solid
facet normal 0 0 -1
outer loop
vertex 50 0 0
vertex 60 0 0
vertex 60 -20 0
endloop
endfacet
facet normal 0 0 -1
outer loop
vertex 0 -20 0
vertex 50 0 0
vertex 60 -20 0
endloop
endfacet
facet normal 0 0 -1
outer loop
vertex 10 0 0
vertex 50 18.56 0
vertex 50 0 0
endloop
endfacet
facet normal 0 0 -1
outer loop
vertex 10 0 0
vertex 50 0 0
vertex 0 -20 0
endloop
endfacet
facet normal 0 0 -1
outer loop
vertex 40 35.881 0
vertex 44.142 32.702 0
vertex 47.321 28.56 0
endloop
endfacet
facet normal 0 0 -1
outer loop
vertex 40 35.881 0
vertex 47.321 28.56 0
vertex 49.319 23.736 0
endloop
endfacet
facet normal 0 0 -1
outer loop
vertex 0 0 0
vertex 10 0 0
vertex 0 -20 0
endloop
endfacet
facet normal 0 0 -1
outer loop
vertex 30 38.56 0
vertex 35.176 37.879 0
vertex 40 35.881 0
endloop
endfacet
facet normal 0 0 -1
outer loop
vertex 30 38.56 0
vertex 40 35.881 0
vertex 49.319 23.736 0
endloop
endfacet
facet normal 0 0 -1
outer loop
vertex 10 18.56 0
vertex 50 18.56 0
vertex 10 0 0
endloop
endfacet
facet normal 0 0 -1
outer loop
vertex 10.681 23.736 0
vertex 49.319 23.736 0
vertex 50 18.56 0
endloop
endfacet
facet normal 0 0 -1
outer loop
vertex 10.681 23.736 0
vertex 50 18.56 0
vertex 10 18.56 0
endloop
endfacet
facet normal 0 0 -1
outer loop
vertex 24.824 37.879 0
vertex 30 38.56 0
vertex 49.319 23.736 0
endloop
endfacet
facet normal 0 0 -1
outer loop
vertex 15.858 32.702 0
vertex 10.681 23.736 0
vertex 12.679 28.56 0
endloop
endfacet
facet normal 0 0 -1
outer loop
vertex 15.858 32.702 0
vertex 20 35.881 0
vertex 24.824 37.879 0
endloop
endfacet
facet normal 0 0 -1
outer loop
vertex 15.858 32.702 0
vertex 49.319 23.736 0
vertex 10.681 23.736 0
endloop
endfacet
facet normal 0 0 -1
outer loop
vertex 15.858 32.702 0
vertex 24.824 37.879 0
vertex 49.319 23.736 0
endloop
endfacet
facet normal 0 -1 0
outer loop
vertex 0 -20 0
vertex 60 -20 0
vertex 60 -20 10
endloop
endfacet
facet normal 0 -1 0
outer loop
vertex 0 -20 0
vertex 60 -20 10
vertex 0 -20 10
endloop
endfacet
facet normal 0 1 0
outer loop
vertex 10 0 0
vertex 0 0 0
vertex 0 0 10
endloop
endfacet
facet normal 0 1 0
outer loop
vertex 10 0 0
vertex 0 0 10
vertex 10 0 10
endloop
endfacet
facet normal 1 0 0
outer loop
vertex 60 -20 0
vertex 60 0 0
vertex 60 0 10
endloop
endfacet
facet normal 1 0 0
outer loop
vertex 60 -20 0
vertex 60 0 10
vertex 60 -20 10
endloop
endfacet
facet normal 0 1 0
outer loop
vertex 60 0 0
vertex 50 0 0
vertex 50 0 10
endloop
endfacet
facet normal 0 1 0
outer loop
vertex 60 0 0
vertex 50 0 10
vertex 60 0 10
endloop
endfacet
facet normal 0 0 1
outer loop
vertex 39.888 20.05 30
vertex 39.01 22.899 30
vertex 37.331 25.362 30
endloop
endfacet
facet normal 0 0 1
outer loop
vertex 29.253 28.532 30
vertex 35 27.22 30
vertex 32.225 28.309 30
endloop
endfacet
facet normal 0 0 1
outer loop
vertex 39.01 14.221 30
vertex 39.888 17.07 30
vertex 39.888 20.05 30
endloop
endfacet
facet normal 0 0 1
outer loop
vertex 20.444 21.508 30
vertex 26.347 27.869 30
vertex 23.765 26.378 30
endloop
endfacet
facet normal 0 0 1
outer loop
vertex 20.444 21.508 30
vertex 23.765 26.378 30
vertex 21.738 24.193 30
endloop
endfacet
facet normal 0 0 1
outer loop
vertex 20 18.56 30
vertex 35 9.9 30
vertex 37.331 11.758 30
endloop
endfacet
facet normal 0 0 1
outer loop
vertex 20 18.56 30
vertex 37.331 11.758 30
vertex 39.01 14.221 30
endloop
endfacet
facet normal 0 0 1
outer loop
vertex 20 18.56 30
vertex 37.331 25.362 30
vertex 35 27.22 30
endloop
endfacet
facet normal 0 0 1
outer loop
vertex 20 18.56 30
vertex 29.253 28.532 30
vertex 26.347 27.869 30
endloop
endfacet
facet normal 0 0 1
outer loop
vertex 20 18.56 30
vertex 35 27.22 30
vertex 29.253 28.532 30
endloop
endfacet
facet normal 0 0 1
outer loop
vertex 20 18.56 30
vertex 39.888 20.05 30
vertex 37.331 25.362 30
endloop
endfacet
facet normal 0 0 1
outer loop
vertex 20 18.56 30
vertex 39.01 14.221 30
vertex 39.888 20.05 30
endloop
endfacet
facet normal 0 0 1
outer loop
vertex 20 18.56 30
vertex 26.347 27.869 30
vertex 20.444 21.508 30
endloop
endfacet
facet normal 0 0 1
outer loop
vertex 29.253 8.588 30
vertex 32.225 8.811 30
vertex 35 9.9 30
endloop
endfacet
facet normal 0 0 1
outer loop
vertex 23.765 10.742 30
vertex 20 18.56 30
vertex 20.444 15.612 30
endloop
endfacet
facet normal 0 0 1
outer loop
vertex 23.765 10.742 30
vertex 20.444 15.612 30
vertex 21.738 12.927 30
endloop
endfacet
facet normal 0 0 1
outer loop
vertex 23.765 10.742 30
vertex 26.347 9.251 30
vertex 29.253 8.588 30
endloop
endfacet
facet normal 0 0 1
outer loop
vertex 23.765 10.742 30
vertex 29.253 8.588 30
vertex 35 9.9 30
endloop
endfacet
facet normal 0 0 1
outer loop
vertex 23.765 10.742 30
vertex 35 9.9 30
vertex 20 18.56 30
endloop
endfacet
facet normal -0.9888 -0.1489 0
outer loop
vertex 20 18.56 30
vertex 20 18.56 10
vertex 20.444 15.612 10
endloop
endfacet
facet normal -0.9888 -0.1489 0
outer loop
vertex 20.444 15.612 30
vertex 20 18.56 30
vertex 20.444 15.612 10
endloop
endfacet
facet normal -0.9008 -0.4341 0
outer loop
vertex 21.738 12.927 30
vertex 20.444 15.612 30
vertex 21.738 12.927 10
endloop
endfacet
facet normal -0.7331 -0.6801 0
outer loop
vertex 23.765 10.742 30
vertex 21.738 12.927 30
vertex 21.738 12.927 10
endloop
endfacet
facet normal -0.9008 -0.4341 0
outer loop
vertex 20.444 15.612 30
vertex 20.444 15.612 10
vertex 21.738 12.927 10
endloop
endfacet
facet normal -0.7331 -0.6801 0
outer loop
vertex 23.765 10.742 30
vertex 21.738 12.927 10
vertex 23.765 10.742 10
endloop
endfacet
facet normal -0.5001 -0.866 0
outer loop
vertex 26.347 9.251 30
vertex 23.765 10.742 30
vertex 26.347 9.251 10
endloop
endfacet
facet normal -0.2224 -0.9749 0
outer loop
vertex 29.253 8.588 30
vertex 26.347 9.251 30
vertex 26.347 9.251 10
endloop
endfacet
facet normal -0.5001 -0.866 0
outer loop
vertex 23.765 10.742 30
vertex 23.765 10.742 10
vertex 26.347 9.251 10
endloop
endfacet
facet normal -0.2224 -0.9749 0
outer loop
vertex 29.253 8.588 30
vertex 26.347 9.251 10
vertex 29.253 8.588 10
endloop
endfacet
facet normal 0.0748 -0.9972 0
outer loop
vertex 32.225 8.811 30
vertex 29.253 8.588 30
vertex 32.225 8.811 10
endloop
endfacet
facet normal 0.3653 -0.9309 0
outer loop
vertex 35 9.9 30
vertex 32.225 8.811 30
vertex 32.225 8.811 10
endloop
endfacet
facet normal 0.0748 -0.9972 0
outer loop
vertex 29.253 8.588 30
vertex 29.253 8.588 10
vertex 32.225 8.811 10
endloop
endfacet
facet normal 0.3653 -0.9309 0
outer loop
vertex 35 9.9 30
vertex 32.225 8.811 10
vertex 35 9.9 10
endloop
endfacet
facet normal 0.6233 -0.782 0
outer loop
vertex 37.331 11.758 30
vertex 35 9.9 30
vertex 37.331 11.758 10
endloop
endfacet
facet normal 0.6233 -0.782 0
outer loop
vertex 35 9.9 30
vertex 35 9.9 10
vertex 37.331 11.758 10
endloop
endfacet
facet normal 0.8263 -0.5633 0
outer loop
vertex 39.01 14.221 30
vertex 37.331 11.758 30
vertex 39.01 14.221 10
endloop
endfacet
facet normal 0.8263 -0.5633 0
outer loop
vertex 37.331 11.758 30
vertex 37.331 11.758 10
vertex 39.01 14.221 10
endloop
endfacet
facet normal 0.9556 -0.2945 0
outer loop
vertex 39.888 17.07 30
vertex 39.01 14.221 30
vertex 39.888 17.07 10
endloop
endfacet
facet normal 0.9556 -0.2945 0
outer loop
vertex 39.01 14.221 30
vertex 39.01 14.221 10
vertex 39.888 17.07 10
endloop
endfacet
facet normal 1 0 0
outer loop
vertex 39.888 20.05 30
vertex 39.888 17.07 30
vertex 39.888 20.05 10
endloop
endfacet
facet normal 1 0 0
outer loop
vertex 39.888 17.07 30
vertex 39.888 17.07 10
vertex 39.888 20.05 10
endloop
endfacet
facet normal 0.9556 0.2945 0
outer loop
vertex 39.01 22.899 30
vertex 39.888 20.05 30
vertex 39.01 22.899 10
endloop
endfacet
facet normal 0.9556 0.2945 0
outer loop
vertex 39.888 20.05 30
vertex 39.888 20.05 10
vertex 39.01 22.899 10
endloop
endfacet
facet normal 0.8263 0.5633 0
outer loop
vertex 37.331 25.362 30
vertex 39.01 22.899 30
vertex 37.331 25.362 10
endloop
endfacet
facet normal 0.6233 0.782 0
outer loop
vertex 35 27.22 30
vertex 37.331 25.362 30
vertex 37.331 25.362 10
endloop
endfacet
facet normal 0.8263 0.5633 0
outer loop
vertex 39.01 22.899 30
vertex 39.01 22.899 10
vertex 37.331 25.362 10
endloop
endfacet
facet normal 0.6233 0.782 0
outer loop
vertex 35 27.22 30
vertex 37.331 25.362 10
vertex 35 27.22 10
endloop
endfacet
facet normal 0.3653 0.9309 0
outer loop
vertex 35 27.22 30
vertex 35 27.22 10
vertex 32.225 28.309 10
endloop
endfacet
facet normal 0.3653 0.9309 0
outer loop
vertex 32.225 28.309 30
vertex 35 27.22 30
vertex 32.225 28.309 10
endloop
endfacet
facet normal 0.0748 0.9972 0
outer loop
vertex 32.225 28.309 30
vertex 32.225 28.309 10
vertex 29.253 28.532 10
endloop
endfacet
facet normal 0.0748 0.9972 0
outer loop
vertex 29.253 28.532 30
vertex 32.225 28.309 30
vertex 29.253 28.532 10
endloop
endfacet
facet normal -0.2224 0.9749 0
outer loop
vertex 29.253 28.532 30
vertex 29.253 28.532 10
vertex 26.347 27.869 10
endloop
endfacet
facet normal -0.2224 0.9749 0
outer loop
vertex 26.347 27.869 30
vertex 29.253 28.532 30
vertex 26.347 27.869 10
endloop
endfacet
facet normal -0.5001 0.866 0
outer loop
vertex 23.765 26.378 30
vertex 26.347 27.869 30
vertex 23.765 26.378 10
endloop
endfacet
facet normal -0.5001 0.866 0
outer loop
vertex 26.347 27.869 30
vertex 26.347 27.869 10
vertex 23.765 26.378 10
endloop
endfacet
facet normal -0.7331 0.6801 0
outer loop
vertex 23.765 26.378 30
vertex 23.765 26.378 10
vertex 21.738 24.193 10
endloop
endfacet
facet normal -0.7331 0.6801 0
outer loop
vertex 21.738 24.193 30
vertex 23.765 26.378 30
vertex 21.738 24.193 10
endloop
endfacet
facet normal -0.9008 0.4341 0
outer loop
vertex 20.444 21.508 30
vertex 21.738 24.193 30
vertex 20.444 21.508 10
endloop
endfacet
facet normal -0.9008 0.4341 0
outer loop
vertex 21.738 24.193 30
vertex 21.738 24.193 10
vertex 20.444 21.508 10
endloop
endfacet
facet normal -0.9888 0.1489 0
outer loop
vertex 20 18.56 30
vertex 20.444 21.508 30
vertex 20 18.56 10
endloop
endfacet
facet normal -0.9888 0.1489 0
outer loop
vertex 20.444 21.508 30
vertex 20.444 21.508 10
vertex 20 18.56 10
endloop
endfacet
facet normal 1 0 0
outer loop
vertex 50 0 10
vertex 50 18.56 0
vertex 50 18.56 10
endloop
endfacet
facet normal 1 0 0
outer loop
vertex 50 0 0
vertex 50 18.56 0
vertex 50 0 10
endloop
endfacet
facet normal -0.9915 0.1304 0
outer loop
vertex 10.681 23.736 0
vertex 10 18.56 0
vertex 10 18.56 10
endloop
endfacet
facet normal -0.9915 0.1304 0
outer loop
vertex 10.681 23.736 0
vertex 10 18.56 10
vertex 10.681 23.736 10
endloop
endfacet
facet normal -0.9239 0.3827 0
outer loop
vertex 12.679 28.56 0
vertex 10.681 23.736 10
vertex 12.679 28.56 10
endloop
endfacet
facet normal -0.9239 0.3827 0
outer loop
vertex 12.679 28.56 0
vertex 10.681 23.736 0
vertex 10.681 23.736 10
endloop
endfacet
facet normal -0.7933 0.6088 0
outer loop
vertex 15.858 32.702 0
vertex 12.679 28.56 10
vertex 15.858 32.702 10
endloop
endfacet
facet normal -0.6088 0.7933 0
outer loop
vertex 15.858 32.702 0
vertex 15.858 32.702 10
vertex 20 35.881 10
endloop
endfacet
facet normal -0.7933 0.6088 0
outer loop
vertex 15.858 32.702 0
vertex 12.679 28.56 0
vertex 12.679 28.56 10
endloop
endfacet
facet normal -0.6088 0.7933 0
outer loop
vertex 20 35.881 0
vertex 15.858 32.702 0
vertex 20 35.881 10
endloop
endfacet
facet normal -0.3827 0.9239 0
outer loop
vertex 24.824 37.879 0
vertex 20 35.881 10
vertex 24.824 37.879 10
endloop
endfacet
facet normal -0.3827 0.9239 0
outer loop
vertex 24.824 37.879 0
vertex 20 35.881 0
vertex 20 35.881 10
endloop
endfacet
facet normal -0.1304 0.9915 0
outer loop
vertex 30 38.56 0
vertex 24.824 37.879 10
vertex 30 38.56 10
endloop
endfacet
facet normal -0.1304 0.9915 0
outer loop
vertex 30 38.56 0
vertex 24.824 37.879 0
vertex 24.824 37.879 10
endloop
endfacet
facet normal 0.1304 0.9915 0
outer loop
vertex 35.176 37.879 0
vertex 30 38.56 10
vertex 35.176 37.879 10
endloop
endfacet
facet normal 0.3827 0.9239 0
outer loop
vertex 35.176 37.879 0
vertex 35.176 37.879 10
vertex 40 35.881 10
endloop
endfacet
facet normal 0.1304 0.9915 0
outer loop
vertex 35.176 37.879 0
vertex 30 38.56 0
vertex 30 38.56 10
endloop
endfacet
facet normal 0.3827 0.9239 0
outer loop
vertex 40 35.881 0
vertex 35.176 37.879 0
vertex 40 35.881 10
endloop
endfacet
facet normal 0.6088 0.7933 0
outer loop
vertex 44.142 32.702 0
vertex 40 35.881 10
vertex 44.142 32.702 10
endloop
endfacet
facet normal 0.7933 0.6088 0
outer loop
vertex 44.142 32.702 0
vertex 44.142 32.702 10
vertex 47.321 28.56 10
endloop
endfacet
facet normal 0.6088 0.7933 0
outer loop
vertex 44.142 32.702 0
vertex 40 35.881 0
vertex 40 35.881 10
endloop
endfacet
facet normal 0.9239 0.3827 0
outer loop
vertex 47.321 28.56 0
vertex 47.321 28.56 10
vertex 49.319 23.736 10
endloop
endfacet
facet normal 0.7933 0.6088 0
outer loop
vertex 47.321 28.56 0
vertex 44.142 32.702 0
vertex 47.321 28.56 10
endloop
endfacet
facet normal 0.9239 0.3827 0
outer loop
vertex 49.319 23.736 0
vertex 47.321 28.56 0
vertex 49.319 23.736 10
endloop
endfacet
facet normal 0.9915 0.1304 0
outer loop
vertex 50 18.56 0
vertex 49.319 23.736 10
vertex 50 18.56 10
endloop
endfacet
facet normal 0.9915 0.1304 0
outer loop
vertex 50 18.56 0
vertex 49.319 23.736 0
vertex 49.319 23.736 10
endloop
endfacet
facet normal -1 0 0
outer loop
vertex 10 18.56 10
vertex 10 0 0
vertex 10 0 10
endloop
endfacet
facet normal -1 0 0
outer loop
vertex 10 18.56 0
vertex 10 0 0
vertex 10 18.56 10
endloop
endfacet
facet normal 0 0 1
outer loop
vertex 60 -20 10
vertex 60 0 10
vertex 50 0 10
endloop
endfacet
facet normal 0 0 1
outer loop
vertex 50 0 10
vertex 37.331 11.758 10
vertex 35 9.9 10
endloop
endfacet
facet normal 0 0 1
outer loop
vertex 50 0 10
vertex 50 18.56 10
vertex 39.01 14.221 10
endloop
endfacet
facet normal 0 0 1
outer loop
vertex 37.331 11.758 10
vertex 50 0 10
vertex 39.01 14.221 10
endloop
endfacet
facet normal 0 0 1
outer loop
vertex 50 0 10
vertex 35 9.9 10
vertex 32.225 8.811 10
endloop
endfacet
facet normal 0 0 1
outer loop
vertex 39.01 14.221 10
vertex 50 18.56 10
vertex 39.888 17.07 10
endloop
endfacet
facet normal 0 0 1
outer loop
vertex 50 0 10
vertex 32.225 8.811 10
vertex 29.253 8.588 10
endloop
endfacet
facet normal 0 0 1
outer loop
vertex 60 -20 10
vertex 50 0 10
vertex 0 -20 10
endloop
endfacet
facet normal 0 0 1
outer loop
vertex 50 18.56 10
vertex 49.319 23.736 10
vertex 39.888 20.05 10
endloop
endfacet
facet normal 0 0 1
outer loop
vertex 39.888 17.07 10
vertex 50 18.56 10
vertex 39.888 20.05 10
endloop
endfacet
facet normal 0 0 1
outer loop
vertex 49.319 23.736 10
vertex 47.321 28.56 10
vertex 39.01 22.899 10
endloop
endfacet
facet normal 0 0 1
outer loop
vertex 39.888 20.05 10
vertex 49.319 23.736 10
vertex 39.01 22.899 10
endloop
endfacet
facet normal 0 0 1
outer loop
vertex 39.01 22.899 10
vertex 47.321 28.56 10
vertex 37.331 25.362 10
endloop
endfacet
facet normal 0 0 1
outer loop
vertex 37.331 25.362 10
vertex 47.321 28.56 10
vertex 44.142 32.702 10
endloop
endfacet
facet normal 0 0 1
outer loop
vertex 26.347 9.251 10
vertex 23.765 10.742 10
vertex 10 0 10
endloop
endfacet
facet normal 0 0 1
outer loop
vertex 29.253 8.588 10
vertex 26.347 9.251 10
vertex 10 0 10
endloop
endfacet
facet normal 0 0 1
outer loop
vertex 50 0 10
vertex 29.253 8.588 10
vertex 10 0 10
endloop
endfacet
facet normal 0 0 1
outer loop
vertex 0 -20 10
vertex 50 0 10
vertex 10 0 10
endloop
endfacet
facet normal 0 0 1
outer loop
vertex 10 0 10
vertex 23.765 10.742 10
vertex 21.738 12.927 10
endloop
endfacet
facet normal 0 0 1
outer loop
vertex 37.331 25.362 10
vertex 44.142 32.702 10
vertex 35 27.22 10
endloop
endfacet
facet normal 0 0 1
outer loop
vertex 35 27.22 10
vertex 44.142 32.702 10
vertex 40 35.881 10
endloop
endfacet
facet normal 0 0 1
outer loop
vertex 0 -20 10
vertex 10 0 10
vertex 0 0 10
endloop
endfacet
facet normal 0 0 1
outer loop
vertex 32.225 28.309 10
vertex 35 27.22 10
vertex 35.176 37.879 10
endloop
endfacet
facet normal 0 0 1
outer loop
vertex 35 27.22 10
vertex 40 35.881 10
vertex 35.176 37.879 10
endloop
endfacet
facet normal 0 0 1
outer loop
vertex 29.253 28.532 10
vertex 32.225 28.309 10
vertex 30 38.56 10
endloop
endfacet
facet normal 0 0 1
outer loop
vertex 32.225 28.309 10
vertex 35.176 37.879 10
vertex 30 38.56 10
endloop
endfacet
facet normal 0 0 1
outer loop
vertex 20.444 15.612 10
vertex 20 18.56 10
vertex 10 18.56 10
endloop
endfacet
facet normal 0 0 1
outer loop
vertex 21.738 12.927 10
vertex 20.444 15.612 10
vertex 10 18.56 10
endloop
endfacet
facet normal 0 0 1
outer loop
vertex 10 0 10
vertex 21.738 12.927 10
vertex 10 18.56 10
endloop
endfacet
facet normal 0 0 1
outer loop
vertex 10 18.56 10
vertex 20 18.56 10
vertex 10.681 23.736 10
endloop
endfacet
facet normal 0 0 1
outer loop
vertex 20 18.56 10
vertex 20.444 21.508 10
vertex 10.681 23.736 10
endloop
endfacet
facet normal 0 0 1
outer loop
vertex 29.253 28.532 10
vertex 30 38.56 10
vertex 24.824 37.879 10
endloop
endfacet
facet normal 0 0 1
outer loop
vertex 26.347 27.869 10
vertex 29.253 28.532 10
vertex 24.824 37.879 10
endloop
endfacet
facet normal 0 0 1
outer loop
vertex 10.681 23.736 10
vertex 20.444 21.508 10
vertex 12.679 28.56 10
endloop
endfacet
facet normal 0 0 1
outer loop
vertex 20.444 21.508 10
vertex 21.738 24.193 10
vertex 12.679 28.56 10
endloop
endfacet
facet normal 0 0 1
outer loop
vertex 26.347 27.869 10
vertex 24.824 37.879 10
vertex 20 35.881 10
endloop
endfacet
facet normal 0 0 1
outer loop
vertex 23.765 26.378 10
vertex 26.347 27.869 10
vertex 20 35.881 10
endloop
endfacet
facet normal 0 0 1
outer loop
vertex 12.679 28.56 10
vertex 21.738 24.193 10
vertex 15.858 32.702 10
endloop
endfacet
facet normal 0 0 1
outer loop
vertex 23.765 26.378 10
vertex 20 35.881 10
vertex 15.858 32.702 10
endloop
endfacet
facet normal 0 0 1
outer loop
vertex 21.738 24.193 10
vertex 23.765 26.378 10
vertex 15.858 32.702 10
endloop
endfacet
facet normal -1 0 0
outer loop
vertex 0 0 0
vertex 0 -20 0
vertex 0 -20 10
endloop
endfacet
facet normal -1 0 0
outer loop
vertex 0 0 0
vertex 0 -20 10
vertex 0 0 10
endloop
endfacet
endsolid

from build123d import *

# Parameters (mm, degrees)
BOSS_EXTRUDE1_DEPTH = 10
SKETCH3_R           = 10
BOSS_EXTRUDE2_DEPTH = 20


with BuildPart() as part:
    # Sketch2 → Boss-Extrude1 (new body)
    with BuildSketch(Plane.XY):
        with BuildLine():
            Line((0, 0), (10, 0))
            Line((10, 0), (10, 18.56))
            ThreePointArc((10, 18.56), (30, 38.56), (50, 18.56))
            Line((50, 18.56), (50, 0))
            Line((50, 0), (60, 0))
            Line((60, 0), (60, -20))
            Line((60, -20), (0, -20))
            Line((0, -20), (0, 0))
        make_face()
    extrude(amount=BOSS_EXTRUDE1_DEPTH)

    # Sketch3 → Boss-Extrude2 (add)
    with BuildSketch(Plane.XY.offset(10)):
        with Locations(Location((30, 18.56, 0), (0, 0, 180))):
            Circle(SKETCH3_R)
    extrude(amount=BOSS_EXTRUDE2_DEPTH)


solid = part.part
